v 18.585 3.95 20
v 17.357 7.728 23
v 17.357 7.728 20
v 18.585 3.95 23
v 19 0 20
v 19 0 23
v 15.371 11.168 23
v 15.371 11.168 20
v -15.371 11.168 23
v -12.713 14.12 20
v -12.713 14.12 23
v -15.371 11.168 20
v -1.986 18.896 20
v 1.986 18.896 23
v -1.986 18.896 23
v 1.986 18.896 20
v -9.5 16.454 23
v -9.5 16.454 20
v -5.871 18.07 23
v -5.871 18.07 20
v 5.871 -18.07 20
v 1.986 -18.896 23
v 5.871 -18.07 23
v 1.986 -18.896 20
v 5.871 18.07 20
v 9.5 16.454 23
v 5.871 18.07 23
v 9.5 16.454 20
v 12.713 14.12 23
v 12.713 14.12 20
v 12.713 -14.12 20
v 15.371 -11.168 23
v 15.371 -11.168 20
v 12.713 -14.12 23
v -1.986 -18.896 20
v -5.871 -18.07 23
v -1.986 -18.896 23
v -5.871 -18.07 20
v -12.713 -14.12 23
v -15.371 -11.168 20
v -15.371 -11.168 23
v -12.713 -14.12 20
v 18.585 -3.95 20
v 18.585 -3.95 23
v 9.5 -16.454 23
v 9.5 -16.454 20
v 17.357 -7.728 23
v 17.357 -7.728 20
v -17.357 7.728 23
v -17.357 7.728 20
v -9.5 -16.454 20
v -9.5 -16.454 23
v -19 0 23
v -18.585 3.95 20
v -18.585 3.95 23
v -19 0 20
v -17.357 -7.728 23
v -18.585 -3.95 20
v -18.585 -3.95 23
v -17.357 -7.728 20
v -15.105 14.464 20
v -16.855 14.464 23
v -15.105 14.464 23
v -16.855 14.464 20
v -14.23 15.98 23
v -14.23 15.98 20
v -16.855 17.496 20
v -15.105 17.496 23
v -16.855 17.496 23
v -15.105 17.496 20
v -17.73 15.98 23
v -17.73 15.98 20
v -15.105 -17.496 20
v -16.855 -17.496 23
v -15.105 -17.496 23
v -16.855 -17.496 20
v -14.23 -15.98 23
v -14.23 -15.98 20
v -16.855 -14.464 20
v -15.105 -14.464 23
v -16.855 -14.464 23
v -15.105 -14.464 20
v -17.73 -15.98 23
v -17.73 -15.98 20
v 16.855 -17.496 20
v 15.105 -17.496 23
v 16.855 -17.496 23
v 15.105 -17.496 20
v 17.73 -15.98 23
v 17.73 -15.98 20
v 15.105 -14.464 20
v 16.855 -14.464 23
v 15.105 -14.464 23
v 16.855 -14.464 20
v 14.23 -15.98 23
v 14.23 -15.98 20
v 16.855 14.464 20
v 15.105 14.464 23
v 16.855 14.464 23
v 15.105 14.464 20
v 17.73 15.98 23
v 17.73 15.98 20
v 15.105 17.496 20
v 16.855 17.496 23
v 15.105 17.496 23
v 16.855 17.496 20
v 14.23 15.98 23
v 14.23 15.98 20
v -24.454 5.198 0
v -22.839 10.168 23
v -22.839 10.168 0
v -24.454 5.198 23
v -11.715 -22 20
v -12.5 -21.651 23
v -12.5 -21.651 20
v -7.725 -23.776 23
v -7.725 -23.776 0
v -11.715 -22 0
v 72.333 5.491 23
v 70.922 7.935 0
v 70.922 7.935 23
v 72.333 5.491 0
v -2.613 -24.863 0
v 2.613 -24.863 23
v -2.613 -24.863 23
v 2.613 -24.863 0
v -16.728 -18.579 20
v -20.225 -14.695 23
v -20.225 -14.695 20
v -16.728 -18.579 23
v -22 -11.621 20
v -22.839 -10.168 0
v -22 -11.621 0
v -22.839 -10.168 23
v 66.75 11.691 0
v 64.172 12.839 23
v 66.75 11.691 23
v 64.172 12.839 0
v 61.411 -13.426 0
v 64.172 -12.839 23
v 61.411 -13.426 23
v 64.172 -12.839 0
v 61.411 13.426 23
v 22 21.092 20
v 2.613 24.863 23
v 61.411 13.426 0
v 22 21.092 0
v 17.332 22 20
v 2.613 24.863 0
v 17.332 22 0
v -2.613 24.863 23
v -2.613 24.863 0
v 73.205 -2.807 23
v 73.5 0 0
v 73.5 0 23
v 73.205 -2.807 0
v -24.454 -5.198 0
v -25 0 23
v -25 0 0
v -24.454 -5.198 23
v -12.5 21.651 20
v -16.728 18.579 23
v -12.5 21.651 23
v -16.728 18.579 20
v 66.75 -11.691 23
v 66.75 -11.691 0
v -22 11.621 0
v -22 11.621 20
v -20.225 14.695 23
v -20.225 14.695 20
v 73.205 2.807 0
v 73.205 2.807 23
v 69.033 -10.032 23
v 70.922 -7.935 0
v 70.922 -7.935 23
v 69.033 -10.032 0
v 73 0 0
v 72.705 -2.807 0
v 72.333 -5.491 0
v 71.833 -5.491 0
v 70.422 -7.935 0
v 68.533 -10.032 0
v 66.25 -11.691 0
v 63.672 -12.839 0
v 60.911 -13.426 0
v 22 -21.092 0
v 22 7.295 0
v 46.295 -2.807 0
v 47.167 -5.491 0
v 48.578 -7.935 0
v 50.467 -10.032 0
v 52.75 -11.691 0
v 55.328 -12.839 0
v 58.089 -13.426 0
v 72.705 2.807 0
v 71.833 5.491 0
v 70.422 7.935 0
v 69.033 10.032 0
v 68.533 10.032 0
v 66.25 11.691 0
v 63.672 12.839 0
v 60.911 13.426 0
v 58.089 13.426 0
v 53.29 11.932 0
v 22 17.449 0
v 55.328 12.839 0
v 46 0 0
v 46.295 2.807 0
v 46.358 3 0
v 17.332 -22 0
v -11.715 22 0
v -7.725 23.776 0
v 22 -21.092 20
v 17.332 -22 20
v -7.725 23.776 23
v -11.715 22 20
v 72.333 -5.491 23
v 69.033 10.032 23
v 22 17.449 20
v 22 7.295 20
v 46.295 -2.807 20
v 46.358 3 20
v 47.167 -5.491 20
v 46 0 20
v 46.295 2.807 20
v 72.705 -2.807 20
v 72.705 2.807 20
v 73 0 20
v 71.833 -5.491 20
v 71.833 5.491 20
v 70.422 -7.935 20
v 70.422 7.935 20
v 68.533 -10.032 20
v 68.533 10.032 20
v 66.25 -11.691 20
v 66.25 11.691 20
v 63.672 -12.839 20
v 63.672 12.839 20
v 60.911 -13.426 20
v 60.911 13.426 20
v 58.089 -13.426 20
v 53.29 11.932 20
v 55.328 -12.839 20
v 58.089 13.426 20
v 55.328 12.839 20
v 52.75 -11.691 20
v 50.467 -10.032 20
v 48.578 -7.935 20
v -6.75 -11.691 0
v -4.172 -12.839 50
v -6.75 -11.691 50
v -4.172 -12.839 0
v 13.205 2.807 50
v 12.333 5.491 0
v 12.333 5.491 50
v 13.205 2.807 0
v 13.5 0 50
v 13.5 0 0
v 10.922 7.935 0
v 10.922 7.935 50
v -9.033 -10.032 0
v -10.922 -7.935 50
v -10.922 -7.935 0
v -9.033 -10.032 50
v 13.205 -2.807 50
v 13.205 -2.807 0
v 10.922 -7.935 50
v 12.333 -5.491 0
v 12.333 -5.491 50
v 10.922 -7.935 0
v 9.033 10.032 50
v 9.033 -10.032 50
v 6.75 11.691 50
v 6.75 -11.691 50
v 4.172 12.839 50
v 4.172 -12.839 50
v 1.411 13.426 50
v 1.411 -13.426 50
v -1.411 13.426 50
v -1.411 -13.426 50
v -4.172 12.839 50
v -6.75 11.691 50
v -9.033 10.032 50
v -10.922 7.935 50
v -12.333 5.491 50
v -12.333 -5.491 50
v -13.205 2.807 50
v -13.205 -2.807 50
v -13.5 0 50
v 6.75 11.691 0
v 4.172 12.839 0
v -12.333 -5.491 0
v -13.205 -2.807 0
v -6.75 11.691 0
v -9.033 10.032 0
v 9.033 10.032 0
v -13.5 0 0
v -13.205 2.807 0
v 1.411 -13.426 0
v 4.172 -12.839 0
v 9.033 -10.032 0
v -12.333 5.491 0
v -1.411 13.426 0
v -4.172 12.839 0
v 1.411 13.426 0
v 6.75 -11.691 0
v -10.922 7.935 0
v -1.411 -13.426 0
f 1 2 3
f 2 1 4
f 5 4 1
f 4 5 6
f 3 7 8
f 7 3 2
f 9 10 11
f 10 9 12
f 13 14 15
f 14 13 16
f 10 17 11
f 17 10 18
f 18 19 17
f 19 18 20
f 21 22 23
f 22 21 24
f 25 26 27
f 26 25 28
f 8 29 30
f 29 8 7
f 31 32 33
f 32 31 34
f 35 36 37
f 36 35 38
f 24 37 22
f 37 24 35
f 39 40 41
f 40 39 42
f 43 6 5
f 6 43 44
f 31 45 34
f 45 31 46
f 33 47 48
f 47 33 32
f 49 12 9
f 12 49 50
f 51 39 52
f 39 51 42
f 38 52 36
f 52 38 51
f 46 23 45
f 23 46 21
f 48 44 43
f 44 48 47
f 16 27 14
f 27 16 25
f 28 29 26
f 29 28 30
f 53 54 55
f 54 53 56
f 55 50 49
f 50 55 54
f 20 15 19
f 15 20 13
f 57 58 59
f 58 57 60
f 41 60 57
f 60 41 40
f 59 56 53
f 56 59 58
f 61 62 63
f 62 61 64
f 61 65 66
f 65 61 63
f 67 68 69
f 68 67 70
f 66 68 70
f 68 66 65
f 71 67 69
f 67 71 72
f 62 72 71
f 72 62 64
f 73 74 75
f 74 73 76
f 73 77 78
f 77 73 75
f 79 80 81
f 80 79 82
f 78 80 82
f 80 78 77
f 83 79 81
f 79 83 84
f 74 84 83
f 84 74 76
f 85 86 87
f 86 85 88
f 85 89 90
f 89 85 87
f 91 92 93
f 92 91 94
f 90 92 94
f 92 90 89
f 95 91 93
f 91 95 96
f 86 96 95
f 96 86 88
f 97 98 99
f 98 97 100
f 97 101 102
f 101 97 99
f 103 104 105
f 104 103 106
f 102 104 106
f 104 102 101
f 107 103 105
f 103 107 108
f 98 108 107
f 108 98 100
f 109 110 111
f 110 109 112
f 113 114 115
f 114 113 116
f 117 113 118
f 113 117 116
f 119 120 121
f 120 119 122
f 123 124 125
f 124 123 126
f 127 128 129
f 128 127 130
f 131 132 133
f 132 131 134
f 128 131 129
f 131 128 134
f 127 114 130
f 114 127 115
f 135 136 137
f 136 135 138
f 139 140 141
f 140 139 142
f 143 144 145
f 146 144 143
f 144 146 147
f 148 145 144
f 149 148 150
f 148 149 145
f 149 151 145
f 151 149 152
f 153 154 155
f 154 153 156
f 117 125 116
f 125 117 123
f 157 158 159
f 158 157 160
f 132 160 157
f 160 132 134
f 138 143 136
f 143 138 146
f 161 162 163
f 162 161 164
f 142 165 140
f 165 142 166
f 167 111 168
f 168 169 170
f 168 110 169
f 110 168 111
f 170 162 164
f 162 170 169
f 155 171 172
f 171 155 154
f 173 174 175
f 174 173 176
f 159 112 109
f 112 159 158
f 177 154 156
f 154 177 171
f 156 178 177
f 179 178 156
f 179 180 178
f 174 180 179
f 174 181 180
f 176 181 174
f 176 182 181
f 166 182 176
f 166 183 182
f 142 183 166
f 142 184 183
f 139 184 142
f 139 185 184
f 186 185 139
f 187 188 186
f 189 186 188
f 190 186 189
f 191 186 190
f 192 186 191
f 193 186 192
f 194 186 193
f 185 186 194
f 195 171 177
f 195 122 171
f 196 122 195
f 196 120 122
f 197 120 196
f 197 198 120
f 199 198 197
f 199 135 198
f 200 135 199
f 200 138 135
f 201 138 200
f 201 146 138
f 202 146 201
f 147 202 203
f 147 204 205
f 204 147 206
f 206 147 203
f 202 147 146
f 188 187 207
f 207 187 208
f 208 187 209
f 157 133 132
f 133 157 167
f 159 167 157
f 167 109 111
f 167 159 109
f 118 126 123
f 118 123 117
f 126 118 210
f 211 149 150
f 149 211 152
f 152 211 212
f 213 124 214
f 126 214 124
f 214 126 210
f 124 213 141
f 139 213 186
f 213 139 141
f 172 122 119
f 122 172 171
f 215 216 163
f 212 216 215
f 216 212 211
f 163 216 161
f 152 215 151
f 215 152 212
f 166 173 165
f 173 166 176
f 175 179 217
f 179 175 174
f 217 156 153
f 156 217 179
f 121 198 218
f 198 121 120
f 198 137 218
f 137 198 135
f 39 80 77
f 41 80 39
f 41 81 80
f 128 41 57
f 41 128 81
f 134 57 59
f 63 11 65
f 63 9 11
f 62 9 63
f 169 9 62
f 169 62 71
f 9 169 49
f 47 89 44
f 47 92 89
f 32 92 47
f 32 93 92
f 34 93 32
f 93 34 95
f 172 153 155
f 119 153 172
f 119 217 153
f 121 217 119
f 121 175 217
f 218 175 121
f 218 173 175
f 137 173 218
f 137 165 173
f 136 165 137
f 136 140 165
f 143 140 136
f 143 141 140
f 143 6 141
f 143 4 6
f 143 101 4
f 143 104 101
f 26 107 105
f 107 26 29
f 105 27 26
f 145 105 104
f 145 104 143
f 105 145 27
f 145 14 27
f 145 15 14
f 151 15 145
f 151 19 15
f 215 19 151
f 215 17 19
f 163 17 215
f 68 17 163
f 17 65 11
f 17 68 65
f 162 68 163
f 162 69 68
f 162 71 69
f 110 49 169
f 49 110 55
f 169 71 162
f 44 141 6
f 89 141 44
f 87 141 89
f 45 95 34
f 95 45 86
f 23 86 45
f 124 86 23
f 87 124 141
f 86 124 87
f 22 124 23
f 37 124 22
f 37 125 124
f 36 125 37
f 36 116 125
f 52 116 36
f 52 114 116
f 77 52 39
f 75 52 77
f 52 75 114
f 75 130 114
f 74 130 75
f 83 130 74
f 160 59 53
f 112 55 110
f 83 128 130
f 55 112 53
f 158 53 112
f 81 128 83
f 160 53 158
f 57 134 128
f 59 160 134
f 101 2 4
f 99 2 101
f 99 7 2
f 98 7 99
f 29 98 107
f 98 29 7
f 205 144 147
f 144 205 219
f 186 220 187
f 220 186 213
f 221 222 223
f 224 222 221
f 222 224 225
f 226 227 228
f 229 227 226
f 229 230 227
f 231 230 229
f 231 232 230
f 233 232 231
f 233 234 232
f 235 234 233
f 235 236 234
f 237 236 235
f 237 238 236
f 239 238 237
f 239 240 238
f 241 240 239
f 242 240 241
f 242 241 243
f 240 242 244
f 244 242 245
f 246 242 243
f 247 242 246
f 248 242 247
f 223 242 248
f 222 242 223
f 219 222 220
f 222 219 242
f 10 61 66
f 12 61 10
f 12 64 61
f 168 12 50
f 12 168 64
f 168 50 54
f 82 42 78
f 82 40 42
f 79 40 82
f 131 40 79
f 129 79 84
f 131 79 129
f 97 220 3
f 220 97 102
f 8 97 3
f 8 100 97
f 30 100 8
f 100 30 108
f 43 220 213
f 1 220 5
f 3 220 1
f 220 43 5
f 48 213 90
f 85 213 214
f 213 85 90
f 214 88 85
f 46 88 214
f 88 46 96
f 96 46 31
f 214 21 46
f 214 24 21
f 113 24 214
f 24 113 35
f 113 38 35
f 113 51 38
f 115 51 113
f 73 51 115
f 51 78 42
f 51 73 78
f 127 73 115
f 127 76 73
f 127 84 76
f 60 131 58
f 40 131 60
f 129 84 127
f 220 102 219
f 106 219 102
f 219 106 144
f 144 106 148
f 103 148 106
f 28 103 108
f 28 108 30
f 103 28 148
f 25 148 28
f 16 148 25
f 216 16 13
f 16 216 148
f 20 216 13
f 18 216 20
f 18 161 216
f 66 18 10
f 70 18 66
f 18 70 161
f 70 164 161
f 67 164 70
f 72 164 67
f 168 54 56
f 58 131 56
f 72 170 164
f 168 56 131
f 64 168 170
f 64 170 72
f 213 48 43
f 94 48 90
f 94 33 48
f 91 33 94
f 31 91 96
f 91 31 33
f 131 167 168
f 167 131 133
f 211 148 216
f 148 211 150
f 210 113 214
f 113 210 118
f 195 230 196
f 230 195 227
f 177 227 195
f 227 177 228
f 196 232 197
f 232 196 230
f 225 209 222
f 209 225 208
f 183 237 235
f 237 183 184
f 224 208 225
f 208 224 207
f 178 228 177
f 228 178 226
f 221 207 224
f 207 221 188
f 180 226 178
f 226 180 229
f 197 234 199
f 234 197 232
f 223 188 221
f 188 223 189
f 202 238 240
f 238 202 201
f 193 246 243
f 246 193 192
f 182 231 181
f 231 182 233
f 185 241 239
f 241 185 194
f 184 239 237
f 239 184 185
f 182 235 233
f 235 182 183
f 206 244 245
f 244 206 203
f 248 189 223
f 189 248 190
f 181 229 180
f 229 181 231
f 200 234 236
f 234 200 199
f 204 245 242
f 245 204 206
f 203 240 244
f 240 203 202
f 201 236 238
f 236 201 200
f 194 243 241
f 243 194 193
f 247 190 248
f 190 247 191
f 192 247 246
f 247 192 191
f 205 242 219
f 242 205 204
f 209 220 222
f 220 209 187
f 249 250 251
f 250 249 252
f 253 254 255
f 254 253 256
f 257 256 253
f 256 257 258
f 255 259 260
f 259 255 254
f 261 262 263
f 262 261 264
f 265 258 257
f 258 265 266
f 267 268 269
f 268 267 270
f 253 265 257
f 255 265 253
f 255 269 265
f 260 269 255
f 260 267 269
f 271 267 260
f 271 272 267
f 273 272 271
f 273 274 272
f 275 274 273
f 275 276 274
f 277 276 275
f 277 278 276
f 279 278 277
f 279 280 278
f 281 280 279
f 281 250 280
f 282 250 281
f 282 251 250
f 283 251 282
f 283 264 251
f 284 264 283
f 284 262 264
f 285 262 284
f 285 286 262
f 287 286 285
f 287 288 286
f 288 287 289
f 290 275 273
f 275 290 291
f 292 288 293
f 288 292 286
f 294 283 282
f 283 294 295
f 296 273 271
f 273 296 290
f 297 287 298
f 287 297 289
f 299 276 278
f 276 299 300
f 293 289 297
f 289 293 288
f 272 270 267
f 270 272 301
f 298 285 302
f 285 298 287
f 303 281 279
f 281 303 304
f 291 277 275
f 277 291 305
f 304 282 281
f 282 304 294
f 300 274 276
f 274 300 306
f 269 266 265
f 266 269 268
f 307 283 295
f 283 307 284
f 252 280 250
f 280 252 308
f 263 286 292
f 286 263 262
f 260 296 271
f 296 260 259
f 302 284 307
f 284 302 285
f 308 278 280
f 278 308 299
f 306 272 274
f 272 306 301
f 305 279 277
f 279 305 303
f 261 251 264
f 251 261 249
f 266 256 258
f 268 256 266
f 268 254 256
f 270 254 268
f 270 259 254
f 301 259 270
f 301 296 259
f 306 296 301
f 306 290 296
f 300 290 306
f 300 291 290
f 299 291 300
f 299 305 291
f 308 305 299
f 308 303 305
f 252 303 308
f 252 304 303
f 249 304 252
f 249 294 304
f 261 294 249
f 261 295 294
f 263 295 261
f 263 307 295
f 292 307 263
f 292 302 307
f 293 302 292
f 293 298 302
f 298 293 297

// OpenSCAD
// file: coolerator-battery.scad
BATTERY_DIAMETER = 21;

cylinder(r=(BATTERY_DIAMETER/2)+3,h=50);

module battery(){
  BATTERY_DIAMETER = 22;
  BATTERY_LENGTH = 102;
  USB_OFFSET = 5;
  USB_LENGTH = 12;
  USB_WIDTH = 5;

  difference(){
    union(){
      cylinder(r=BATTERY_DIAMETER/2, h=BATTERY_LENGTH);
      
      // clip
      translate([-9.5/2,-(BATTERY_DIAMETER/2)-1,0]){
        cube([9.5,BATTERY_DIAMETER/2,39]);
      }
    }
    // USB input
    translate([-USB_LENGTH/2, (BATTERY_DIAMETER/2)-USB_OFFSET-USB_WIDTH,-1]){
      cube([USB_LENGTH,USB_WIDTH,10]);
    }
  }
}
// file: fan_40mm.scad
module fan(){

  FAN_HOLE_DIAMETER = 38;
  HOLE_DEPTH = 25;
  MOUNTING_HOLE_DIAMETER = 3.5;
  
  //difference(){
  union(){
  
    // bounding box
    cube([40,10.3,40]);

    // blade opening
    translate([20,-1,20]){
      rotate([-90,0,0]){
        cylinder(r=FAN_HOLE_DIAMETER/2,h=HOLE_DEPTH);
      }
    }
    
    // mounting holes
    DISTANCE_FROM_BOUNDS = (2.27 + (3.5/2));
    
    translate([DISTANCE_FROM_BOUNDS,-1,DISTANCE_FROM_BOUNDS]){
      rotate([-90,0,0]){
        cylinder(r=MOUNTING_HOLE_DIAMETER/2,h=HOLE_DEPTH);
      }
    }

    translate([DISTANCE_FROM_BOUNDS,-1, 40 - DISTANCE_FROM_BOUNDS]){
      rotate([-90,0,0]){
        cylinder(r=MOUNTING_HOLE_DIAMETER/2,h=HOLE_DEPTH);
      }
    }
    
    translate([40 - DISTANCE_FROM_BOUNDS,-1, 40 - DISTANCE_FROM_BOUNDS]){
      rotate([-90,0,0]){
        cylinder(r=MOUNTING_HOLE_DIAMETER/2,h=HOLE_DEPTH);
      }
    }
    
    translate([40 - DISTANCE_FROM_BOUNDS,-1,DISTANCE_FROM_BOUNDS]){
      rotate([-90,0,0]){
        cylinder(r=MOUNTING_HOLE_DIAMETER/2,h=HOLE_DEPTH);
      }
    }  
  }
}
// main file
include <fan_40mm.scad>
include <coolerator-battery.scad>

/*
  usb battery measurements:
  diameter: 22mm
    with clip: 23mm
  clip width: 9mm
  "bottom" of USB input: 6mm
  distance from battery top to USB plug "flange": ~5mm
*/

handle();
/*
translate([59.5,0,20]){
  rotate([180,0,-90]){
    battery();
  }
}
*/
module handle(){
    BATTERY_DIAMETER = 21;

    difference(){
        hull(){
            cylinder(r=25,h=23);
            
            translate([60,0,0]){
                cylinder(r=(BATTERY_DIAMETER/2)+3,h=23);
            }
        }
        
        // fan mount & airway cut-outs
        translate([-20,20,-0.5]){
            rotate([90,0,0]){
                fan();
            }
        }
        
        // extra fan clearance
        translate([-22,-22,-1]){
            cube([44,44,21]);
        }
        
        // base battery opening
        translate([59.5,0,-30]){
          cylinder(r=(BATTERY_DIAMETER/2)+3,h=50);
          /*
          rotate([180,0,-90]){
            battery();
          }
          */
        }
        
        // cable mgmt
        translate([18,8,-1]){
            rotate([0,0,-10]){
                cube([38,10,21]);
            }
        }
    }
}
